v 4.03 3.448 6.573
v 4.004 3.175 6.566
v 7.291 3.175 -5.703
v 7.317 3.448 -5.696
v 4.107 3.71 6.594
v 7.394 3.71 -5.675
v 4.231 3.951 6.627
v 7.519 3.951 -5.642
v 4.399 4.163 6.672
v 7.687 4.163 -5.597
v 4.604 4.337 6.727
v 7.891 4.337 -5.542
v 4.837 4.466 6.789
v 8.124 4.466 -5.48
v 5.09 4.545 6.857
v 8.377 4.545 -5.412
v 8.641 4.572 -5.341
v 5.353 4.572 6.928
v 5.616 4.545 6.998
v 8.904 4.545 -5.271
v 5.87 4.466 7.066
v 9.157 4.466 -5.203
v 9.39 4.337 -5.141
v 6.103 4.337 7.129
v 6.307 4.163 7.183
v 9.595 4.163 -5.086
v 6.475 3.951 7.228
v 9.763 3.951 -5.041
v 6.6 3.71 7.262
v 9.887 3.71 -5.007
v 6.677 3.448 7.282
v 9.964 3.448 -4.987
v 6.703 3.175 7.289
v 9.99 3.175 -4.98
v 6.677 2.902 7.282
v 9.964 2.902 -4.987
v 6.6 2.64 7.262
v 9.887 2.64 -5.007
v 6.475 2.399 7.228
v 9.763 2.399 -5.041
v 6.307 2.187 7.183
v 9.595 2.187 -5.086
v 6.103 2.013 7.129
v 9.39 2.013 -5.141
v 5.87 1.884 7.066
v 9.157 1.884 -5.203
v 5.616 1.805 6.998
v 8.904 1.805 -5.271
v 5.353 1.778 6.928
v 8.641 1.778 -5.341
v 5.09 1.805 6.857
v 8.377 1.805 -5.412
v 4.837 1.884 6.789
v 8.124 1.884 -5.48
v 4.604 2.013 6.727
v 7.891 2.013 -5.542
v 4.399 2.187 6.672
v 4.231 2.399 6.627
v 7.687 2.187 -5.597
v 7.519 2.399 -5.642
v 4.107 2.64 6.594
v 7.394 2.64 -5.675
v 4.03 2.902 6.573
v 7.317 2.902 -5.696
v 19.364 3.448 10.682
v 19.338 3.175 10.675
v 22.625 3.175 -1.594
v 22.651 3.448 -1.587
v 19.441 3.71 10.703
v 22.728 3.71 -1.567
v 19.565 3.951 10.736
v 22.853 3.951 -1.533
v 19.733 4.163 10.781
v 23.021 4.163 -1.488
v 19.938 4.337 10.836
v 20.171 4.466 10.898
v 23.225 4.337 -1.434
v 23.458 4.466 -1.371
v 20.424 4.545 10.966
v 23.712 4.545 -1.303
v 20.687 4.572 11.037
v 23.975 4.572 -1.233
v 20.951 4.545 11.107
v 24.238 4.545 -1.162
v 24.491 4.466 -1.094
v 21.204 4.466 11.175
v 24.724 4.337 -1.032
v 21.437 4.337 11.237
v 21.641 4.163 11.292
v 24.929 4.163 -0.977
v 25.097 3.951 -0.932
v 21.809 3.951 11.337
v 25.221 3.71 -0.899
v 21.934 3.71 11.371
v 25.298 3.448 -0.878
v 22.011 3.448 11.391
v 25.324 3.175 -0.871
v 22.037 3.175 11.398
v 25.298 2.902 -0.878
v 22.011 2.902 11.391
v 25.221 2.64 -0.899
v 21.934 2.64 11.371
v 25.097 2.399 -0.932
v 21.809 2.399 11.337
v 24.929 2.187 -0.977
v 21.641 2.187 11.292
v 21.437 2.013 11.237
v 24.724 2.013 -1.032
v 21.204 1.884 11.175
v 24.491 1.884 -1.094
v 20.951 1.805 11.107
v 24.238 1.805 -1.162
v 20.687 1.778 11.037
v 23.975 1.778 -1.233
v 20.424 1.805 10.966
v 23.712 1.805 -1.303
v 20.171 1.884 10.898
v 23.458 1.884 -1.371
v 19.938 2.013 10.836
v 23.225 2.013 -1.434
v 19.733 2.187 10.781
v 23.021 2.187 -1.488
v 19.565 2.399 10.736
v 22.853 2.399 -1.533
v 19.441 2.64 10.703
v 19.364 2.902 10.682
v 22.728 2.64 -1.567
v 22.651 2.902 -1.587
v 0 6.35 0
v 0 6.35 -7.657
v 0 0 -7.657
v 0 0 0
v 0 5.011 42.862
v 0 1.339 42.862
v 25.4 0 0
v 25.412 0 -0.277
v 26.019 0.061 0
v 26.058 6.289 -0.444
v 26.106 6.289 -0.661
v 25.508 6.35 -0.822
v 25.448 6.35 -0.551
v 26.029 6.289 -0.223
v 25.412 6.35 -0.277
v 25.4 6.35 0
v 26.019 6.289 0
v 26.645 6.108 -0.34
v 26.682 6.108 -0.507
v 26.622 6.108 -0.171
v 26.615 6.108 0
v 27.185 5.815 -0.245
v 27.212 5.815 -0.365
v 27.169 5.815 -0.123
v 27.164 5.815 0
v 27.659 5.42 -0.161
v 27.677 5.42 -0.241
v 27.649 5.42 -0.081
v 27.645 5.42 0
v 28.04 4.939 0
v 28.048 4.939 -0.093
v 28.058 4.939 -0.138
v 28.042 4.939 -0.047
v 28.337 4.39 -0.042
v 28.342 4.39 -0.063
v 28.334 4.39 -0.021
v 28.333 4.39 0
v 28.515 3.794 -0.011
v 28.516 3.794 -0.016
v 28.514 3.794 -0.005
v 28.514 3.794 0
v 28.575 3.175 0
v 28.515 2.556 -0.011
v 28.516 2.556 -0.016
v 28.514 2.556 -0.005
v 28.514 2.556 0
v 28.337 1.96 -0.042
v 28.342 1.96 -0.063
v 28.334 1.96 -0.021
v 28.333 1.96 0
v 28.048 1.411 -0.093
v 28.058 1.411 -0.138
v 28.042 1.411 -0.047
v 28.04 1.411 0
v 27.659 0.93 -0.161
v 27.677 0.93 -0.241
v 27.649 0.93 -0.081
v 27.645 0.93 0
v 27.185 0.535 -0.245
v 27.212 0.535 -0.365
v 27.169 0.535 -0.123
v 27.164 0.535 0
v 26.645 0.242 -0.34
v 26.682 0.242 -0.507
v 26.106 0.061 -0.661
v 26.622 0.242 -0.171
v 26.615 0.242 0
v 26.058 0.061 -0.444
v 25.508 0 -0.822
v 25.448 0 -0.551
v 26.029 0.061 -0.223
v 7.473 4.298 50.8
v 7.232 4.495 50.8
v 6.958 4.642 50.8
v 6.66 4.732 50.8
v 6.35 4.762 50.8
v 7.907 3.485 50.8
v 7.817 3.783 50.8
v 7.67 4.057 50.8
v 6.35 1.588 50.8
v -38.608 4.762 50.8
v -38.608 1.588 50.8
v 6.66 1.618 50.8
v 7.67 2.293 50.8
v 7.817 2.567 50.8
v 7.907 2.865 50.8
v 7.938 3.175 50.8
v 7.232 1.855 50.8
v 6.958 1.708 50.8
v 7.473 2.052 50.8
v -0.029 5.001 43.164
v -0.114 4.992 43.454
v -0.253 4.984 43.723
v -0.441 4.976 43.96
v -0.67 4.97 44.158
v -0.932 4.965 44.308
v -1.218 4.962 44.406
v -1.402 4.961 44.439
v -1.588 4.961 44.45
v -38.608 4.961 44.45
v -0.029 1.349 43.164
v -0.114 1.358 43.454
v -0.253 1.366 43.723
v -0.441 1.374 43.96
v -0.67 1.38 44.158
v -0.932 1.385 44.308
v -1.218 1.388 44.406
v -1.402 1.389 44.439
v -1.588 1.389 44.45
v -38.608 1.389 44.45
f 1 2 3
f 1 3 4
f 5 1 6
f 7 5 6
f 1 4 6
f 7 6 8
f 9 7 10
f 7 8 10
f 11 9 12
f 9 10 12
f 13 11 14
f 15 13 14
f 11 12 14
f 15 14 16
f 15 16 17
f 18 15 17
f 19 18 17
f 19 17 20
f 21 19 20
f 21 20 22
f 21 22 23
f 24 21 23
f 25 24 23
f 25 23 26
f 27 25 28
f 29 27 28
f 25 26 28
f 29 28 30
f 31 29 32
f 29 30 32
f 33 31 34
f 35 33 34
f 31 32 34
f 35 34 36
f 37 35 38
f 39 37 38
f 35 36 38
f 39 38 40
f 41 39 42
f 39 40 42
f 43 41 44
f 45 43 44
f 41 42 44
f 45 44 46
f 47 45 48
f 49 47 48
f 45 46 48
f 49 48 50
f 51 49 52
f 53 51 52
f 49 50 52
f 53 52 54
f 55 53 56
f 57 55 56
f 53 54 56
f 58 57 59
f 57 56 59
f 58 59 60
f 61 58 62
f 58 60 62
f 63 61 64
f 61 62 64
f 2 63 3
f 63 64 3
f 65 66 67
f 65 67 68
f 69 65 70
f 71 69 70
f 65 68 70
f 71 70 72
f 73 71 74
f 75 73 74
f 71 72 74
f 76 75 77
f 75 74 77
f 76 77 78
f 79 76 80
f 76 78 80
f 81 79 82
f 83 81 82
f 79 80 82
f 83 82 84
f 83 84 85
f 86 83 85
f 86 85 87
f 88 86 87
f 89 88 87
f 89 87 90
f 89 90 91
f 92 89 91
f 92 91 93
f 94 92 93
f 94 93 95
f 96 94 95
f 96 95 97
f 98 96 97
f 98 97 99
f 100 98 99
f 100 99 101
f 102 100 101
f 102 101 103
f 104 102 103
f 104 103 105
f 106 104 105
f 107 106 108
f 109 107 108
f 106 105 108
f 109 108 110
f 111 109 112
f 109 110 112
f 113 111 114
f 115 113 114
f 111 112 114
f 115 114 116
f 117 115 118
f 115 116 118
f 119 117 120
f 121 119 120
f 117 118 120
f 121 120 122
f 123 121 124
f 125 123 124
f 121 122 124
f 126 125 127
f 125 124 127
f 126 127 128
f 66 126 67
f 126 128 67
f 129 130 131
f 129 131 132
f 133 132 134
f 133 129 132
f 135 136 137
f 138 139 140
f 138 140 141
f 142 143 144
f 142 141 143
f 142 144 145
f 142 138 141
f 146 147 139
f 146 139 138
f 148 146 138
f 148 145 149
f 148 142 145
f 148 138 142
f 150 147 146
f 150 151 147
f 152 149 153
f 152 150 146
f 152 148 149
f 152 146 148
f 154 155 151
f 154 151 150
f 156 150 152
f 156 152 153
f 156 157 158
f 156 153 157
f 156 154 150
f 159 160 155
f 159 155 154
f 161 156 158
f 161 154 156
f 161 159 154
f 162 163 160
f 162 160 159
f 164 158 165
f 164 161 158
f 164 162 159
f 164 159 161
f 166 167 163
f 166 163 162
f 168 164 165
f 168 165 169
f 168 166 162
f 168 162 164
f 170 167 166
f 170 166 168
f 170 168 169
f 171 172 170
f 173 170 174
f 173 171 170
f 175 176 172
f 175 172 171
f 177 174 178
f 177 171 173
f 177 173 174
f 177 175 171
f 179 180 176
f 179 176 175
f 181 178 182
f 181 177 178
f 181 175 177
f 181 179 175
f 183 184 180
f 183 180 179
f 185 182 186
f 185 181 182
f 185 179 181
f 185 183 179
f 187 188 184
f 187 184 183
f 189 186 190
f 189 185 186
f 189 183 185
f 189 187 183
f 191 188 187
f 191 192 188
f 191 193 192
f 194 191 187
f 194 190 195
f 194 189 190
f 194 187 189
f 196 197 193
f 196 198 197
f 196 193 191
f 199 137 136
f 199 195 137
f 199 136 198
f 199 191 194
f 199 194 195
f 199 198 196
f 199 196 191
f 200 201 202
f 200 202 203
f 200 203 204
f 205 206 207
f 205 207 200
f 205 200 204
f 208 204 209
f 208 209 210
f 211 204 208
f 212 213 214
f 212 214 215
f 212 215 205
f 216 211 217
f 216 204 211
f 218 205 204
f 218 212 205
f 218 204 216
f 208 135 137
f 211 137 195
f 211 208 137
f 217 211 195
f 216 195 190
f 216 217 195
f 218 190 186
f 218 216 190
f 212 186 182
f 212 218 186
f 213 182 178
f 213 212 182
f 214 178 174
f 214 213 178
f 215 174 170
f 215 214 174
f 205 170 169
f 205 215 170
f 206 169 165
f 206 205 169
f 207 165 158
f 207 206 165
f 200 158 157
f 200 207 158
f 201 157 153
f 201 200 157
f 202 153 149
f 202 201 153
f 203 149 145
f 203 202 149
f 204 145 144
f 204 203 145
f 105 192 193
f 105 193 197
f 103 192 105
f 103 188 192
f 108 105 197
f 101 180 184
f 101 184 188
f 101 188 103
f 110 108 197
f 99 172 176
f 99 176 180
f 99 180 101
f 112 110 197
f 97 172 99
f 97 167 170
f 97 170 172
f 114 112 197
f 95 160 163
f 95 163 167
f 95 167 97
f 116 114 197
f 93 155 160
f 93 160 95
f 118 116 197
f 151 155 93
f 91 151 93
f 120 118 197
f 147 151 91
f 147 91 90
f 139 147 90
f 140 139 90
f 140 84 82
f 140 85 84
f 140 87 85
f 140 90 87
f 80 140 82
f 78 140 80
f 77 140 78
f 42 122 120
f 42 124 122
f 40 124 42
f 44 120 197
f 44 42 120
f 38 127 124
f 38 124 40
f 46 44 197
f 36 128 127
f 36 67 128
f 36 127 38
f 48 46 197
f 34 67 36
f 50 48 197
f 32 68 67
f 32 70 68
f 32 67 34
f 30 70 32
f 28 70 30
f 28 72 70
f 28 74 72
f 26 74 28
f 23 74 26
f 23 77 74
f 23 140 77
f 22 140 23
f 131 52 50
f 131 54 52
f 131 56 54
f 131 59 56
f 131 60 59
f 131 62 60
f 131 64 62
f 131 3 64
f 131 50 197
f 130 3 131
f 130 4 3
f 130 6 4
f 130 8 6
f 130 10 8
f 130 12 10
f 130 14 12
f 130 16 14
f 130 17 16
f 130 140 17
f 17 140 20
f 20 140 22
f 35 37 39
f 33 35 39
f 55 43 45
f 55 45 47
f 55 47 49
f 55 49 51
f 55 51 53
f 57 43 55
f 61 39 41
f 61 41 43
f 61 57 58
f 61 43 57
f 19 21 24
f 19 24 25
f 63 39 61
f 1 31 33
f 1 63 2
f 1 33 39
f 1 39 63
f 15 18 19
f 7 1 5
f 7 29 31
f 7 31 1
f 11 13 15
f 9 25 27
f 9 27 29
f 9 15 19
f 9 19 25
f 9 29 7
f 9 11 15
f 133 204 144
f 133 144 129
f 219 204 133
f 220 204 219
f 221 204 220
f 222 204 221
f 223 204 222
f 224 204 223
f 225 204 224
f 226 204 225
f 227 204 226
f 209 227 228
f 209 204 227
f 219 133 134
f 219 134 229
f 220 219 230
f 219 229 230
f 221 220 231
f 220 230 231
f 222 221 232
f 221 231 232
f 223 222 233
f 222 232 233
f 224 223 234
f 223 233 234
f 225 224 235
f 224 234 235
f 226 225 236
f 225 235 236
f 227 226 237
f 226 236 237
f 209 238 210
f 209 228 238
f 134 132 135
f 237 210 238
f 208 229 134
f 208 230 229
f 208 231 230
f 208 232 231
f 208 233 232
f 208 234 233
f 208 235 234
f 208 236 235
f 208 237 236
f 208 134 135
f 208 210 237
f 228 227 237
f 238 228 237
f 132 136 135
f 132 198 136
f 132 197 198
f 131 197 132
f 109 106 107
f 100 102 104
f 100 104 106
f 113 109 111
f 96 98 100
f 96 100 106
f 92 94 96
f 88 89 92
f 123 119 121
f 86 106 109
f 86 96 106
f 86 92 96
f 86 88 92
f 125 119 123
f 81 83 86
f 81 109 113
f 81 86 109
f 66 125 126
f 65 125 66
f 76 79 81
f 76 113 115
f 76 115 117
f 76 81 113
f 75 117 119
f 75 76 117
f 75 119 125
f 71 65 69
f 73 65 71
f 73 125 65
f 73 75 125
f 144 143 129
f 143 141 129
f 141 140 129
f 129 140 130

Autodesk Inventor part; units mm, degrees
ref_plane "YZ Plane" through (0, 0, 0) normal (1, 0, 0) x (0, 1, 0)
ref_plane "XZ Plane" through (0, 0, 0) normal (0, 1, 0) x (-1, 0, 0)
sketch "Sketch2" plane through (0, 0, 0) normal (0, 0, 1) x (1, 0, 0)
  line L0 (0, 0) -> (25.4, 0)
  line L1 (25.4, 0) -> (25.4, 6.35)
  line L2 (25.4, 6.35) -> (0, 6.35)
  line L3 (0, 6.35) -> (0, 0)
  arc A0 (25.4, 0) -> (25.4, 6.35) centre (25.4, 3.175) ccw
  dimension "d0" = 25.4
  dimension "d1" = 6.35
ref_plane "Work Plane1" through (0, 0, 50.8) normal (0, 0, 1) x (1, 0, 0)
sketch "Sketch3" plane through (0, 0, 50.8) normal (0, 0, 1) x (1, 0, 0)
  line L0 (0, 1.5875) -> (6.35, 1.5875)
  line L1 (6.35, 1.5875) -> (6.35, 4.7625)
  line L2 (6.35, 4.7625) -> (0, 4.7625)
  line L3 (0, 4.7625) -> (0, 1.5875)
  arc A0 (6.35, 1.5875) -> (6.35, 4.7625) centre (6.35, 3.175) ccw
  point P0 (0, 0)
  dimension "d3" = 6.35
  dimension "d4" = 3.175
  dimension "d5" = 1.5875
loft "Loft1" add profiles "Sketch2", "Sketch3"
sketch "Sketch4" plane through (0, 0, 0) normal (-1, 0, 0) x (0, 0, 1)
  line L0 (0, 6.35) -> (0, 0)
  line L1 (0, 0) -> (50.8, 1.5875)
  line L2 (50.8, 4.7625) -> (50.8, 1.5875)
  line L3 (0, 6.35) -> (50.8, 4.7625)
  line L4 (0, 6.35) -> (50.8, 4.7625)
  line L5 (44.45, 4.960938) -> (44.45, 1.389063)
  line L6 (50.8, 1.5875) -> (0, 0)
  dimension "d10" = 6.35
extrude "Extrusion1" add sketch "Sketch4" along normal blind 38.608 contours L3 L2 L1 L5
sketch "Sketch5" plane through (25.4, 6.35, 0) normal (0, 0, -1) x (-1, 0, 0)
  line L0 (25.4, 0) -> (25.4, -6.35)
  line L1 (0, 0) -> (25.4, 0)
  arc A0 (0, 0) -> (0, -6.35) centre (0, -3.175) ccw
  line L2 (25.4, -6.35) -> (0, -6.35)
  line L3 (25.4, 0) -> (25.4, -6.35)
  line L4 (25.4, 0) -> (36.148692, 0)
  line L5 (36.148692, 0) -> (36.148692, -6.35)
  line L6 (36.148692, -6.35) -> (25.4, -6.35)
  line L7 (25.4, -6.35) -> (25.4, 0)
  line L8 (-3.175, -0.10761) -> (-3.175, -7.006989)
sketch "Sketch5 outline for Revolution1" plane through (25.4, 6.35, 0) normal (0, 0, -1) x (-1, 0, 0)
  line L0 (36.148692, 0) -> (0, 0)
  arc A0 (0, 0) -> (0, -6.35) centre (0, -3.175) ccw
  line L1 (0, -6.35) -> (36.148692, -6.35)
  line L2 (36.148692, -6.35) -> (36.148692, 0)
revolve "Revolution1" add sketch "Sketch5 outline for Revolution1" angle 15 about axis through (28.575, 6.24239, 0) along (0, -1, 0)
sketch "Sketch7" plane through (-10.748692, 6.35, 0) normal (0, 1, 0) x (1, 0, 0)
  line L0 (0, 0) -> (10.748692, 0)
  line L1 (36.148692, 0) -> (10.748692, 0)
  arc A0 (36.256878, 0.82175) -> (36.148692, 0) centre (39.323692, 0) ccw
  line L2 (1.339922, 10.17772) -> (36.256878, 0.82175)
  arc A1 (1.339922, 10.17772) -> (0, 0) centre (39.323692, 0) ccw
  line L3 (10.748692, 0) -> (10.748692, -44.45)
  line L4 (10.748692, 0) -> (-2.055619, 0)
  line L5 (-2.055619, 0) -> (-2.055619, 10.694673)
  line L6 (-2.055619, 10.694673) -> (10.748692, 10.694673)
  line L7 (10.748692, 10.694673) -> (10.748692, 0)
extrude "Extrusion2" cut sketch "Sketch7" against normal blind 38.1 contours A1 L2 L7 L0 | L4 L5 L6 L7 L2 A1
fillet "Fillet1" radius 1.5875 1 edges at (0, 3.175, 44.45)
sketch "Sketch8" plane through (0, 0, -7.656648) normal (0.258819, 0, -0.9659258) x (-0.9659258, 0, -0.258819)
  line L0 (-29.583017, 3.175) -> (-24.820517, 3.175)
  line L1 (-24.820517, 3.175) -> (-8.945517, 3.175)
  circle A0 centre (-24.820517, 3.175) radius 1.397
  circle A1 centre (-8.945517, 3.175) radius 1.397
  line L2 (-26.408017, 0) -> (0, 0)
  point P0 (-1.981686, 0)
  dimension "d17" = 4.7625
  dimension "d18" = 15.875
  dimension "d19" = 2.794
  dimension "d20" = 2.794
  dimension "d23" = 3.175
extrude "Extrusion4" cut sketch "Sketch8" against normal blind 12.7
properties part number "DivePlanesStabilizingFins"
